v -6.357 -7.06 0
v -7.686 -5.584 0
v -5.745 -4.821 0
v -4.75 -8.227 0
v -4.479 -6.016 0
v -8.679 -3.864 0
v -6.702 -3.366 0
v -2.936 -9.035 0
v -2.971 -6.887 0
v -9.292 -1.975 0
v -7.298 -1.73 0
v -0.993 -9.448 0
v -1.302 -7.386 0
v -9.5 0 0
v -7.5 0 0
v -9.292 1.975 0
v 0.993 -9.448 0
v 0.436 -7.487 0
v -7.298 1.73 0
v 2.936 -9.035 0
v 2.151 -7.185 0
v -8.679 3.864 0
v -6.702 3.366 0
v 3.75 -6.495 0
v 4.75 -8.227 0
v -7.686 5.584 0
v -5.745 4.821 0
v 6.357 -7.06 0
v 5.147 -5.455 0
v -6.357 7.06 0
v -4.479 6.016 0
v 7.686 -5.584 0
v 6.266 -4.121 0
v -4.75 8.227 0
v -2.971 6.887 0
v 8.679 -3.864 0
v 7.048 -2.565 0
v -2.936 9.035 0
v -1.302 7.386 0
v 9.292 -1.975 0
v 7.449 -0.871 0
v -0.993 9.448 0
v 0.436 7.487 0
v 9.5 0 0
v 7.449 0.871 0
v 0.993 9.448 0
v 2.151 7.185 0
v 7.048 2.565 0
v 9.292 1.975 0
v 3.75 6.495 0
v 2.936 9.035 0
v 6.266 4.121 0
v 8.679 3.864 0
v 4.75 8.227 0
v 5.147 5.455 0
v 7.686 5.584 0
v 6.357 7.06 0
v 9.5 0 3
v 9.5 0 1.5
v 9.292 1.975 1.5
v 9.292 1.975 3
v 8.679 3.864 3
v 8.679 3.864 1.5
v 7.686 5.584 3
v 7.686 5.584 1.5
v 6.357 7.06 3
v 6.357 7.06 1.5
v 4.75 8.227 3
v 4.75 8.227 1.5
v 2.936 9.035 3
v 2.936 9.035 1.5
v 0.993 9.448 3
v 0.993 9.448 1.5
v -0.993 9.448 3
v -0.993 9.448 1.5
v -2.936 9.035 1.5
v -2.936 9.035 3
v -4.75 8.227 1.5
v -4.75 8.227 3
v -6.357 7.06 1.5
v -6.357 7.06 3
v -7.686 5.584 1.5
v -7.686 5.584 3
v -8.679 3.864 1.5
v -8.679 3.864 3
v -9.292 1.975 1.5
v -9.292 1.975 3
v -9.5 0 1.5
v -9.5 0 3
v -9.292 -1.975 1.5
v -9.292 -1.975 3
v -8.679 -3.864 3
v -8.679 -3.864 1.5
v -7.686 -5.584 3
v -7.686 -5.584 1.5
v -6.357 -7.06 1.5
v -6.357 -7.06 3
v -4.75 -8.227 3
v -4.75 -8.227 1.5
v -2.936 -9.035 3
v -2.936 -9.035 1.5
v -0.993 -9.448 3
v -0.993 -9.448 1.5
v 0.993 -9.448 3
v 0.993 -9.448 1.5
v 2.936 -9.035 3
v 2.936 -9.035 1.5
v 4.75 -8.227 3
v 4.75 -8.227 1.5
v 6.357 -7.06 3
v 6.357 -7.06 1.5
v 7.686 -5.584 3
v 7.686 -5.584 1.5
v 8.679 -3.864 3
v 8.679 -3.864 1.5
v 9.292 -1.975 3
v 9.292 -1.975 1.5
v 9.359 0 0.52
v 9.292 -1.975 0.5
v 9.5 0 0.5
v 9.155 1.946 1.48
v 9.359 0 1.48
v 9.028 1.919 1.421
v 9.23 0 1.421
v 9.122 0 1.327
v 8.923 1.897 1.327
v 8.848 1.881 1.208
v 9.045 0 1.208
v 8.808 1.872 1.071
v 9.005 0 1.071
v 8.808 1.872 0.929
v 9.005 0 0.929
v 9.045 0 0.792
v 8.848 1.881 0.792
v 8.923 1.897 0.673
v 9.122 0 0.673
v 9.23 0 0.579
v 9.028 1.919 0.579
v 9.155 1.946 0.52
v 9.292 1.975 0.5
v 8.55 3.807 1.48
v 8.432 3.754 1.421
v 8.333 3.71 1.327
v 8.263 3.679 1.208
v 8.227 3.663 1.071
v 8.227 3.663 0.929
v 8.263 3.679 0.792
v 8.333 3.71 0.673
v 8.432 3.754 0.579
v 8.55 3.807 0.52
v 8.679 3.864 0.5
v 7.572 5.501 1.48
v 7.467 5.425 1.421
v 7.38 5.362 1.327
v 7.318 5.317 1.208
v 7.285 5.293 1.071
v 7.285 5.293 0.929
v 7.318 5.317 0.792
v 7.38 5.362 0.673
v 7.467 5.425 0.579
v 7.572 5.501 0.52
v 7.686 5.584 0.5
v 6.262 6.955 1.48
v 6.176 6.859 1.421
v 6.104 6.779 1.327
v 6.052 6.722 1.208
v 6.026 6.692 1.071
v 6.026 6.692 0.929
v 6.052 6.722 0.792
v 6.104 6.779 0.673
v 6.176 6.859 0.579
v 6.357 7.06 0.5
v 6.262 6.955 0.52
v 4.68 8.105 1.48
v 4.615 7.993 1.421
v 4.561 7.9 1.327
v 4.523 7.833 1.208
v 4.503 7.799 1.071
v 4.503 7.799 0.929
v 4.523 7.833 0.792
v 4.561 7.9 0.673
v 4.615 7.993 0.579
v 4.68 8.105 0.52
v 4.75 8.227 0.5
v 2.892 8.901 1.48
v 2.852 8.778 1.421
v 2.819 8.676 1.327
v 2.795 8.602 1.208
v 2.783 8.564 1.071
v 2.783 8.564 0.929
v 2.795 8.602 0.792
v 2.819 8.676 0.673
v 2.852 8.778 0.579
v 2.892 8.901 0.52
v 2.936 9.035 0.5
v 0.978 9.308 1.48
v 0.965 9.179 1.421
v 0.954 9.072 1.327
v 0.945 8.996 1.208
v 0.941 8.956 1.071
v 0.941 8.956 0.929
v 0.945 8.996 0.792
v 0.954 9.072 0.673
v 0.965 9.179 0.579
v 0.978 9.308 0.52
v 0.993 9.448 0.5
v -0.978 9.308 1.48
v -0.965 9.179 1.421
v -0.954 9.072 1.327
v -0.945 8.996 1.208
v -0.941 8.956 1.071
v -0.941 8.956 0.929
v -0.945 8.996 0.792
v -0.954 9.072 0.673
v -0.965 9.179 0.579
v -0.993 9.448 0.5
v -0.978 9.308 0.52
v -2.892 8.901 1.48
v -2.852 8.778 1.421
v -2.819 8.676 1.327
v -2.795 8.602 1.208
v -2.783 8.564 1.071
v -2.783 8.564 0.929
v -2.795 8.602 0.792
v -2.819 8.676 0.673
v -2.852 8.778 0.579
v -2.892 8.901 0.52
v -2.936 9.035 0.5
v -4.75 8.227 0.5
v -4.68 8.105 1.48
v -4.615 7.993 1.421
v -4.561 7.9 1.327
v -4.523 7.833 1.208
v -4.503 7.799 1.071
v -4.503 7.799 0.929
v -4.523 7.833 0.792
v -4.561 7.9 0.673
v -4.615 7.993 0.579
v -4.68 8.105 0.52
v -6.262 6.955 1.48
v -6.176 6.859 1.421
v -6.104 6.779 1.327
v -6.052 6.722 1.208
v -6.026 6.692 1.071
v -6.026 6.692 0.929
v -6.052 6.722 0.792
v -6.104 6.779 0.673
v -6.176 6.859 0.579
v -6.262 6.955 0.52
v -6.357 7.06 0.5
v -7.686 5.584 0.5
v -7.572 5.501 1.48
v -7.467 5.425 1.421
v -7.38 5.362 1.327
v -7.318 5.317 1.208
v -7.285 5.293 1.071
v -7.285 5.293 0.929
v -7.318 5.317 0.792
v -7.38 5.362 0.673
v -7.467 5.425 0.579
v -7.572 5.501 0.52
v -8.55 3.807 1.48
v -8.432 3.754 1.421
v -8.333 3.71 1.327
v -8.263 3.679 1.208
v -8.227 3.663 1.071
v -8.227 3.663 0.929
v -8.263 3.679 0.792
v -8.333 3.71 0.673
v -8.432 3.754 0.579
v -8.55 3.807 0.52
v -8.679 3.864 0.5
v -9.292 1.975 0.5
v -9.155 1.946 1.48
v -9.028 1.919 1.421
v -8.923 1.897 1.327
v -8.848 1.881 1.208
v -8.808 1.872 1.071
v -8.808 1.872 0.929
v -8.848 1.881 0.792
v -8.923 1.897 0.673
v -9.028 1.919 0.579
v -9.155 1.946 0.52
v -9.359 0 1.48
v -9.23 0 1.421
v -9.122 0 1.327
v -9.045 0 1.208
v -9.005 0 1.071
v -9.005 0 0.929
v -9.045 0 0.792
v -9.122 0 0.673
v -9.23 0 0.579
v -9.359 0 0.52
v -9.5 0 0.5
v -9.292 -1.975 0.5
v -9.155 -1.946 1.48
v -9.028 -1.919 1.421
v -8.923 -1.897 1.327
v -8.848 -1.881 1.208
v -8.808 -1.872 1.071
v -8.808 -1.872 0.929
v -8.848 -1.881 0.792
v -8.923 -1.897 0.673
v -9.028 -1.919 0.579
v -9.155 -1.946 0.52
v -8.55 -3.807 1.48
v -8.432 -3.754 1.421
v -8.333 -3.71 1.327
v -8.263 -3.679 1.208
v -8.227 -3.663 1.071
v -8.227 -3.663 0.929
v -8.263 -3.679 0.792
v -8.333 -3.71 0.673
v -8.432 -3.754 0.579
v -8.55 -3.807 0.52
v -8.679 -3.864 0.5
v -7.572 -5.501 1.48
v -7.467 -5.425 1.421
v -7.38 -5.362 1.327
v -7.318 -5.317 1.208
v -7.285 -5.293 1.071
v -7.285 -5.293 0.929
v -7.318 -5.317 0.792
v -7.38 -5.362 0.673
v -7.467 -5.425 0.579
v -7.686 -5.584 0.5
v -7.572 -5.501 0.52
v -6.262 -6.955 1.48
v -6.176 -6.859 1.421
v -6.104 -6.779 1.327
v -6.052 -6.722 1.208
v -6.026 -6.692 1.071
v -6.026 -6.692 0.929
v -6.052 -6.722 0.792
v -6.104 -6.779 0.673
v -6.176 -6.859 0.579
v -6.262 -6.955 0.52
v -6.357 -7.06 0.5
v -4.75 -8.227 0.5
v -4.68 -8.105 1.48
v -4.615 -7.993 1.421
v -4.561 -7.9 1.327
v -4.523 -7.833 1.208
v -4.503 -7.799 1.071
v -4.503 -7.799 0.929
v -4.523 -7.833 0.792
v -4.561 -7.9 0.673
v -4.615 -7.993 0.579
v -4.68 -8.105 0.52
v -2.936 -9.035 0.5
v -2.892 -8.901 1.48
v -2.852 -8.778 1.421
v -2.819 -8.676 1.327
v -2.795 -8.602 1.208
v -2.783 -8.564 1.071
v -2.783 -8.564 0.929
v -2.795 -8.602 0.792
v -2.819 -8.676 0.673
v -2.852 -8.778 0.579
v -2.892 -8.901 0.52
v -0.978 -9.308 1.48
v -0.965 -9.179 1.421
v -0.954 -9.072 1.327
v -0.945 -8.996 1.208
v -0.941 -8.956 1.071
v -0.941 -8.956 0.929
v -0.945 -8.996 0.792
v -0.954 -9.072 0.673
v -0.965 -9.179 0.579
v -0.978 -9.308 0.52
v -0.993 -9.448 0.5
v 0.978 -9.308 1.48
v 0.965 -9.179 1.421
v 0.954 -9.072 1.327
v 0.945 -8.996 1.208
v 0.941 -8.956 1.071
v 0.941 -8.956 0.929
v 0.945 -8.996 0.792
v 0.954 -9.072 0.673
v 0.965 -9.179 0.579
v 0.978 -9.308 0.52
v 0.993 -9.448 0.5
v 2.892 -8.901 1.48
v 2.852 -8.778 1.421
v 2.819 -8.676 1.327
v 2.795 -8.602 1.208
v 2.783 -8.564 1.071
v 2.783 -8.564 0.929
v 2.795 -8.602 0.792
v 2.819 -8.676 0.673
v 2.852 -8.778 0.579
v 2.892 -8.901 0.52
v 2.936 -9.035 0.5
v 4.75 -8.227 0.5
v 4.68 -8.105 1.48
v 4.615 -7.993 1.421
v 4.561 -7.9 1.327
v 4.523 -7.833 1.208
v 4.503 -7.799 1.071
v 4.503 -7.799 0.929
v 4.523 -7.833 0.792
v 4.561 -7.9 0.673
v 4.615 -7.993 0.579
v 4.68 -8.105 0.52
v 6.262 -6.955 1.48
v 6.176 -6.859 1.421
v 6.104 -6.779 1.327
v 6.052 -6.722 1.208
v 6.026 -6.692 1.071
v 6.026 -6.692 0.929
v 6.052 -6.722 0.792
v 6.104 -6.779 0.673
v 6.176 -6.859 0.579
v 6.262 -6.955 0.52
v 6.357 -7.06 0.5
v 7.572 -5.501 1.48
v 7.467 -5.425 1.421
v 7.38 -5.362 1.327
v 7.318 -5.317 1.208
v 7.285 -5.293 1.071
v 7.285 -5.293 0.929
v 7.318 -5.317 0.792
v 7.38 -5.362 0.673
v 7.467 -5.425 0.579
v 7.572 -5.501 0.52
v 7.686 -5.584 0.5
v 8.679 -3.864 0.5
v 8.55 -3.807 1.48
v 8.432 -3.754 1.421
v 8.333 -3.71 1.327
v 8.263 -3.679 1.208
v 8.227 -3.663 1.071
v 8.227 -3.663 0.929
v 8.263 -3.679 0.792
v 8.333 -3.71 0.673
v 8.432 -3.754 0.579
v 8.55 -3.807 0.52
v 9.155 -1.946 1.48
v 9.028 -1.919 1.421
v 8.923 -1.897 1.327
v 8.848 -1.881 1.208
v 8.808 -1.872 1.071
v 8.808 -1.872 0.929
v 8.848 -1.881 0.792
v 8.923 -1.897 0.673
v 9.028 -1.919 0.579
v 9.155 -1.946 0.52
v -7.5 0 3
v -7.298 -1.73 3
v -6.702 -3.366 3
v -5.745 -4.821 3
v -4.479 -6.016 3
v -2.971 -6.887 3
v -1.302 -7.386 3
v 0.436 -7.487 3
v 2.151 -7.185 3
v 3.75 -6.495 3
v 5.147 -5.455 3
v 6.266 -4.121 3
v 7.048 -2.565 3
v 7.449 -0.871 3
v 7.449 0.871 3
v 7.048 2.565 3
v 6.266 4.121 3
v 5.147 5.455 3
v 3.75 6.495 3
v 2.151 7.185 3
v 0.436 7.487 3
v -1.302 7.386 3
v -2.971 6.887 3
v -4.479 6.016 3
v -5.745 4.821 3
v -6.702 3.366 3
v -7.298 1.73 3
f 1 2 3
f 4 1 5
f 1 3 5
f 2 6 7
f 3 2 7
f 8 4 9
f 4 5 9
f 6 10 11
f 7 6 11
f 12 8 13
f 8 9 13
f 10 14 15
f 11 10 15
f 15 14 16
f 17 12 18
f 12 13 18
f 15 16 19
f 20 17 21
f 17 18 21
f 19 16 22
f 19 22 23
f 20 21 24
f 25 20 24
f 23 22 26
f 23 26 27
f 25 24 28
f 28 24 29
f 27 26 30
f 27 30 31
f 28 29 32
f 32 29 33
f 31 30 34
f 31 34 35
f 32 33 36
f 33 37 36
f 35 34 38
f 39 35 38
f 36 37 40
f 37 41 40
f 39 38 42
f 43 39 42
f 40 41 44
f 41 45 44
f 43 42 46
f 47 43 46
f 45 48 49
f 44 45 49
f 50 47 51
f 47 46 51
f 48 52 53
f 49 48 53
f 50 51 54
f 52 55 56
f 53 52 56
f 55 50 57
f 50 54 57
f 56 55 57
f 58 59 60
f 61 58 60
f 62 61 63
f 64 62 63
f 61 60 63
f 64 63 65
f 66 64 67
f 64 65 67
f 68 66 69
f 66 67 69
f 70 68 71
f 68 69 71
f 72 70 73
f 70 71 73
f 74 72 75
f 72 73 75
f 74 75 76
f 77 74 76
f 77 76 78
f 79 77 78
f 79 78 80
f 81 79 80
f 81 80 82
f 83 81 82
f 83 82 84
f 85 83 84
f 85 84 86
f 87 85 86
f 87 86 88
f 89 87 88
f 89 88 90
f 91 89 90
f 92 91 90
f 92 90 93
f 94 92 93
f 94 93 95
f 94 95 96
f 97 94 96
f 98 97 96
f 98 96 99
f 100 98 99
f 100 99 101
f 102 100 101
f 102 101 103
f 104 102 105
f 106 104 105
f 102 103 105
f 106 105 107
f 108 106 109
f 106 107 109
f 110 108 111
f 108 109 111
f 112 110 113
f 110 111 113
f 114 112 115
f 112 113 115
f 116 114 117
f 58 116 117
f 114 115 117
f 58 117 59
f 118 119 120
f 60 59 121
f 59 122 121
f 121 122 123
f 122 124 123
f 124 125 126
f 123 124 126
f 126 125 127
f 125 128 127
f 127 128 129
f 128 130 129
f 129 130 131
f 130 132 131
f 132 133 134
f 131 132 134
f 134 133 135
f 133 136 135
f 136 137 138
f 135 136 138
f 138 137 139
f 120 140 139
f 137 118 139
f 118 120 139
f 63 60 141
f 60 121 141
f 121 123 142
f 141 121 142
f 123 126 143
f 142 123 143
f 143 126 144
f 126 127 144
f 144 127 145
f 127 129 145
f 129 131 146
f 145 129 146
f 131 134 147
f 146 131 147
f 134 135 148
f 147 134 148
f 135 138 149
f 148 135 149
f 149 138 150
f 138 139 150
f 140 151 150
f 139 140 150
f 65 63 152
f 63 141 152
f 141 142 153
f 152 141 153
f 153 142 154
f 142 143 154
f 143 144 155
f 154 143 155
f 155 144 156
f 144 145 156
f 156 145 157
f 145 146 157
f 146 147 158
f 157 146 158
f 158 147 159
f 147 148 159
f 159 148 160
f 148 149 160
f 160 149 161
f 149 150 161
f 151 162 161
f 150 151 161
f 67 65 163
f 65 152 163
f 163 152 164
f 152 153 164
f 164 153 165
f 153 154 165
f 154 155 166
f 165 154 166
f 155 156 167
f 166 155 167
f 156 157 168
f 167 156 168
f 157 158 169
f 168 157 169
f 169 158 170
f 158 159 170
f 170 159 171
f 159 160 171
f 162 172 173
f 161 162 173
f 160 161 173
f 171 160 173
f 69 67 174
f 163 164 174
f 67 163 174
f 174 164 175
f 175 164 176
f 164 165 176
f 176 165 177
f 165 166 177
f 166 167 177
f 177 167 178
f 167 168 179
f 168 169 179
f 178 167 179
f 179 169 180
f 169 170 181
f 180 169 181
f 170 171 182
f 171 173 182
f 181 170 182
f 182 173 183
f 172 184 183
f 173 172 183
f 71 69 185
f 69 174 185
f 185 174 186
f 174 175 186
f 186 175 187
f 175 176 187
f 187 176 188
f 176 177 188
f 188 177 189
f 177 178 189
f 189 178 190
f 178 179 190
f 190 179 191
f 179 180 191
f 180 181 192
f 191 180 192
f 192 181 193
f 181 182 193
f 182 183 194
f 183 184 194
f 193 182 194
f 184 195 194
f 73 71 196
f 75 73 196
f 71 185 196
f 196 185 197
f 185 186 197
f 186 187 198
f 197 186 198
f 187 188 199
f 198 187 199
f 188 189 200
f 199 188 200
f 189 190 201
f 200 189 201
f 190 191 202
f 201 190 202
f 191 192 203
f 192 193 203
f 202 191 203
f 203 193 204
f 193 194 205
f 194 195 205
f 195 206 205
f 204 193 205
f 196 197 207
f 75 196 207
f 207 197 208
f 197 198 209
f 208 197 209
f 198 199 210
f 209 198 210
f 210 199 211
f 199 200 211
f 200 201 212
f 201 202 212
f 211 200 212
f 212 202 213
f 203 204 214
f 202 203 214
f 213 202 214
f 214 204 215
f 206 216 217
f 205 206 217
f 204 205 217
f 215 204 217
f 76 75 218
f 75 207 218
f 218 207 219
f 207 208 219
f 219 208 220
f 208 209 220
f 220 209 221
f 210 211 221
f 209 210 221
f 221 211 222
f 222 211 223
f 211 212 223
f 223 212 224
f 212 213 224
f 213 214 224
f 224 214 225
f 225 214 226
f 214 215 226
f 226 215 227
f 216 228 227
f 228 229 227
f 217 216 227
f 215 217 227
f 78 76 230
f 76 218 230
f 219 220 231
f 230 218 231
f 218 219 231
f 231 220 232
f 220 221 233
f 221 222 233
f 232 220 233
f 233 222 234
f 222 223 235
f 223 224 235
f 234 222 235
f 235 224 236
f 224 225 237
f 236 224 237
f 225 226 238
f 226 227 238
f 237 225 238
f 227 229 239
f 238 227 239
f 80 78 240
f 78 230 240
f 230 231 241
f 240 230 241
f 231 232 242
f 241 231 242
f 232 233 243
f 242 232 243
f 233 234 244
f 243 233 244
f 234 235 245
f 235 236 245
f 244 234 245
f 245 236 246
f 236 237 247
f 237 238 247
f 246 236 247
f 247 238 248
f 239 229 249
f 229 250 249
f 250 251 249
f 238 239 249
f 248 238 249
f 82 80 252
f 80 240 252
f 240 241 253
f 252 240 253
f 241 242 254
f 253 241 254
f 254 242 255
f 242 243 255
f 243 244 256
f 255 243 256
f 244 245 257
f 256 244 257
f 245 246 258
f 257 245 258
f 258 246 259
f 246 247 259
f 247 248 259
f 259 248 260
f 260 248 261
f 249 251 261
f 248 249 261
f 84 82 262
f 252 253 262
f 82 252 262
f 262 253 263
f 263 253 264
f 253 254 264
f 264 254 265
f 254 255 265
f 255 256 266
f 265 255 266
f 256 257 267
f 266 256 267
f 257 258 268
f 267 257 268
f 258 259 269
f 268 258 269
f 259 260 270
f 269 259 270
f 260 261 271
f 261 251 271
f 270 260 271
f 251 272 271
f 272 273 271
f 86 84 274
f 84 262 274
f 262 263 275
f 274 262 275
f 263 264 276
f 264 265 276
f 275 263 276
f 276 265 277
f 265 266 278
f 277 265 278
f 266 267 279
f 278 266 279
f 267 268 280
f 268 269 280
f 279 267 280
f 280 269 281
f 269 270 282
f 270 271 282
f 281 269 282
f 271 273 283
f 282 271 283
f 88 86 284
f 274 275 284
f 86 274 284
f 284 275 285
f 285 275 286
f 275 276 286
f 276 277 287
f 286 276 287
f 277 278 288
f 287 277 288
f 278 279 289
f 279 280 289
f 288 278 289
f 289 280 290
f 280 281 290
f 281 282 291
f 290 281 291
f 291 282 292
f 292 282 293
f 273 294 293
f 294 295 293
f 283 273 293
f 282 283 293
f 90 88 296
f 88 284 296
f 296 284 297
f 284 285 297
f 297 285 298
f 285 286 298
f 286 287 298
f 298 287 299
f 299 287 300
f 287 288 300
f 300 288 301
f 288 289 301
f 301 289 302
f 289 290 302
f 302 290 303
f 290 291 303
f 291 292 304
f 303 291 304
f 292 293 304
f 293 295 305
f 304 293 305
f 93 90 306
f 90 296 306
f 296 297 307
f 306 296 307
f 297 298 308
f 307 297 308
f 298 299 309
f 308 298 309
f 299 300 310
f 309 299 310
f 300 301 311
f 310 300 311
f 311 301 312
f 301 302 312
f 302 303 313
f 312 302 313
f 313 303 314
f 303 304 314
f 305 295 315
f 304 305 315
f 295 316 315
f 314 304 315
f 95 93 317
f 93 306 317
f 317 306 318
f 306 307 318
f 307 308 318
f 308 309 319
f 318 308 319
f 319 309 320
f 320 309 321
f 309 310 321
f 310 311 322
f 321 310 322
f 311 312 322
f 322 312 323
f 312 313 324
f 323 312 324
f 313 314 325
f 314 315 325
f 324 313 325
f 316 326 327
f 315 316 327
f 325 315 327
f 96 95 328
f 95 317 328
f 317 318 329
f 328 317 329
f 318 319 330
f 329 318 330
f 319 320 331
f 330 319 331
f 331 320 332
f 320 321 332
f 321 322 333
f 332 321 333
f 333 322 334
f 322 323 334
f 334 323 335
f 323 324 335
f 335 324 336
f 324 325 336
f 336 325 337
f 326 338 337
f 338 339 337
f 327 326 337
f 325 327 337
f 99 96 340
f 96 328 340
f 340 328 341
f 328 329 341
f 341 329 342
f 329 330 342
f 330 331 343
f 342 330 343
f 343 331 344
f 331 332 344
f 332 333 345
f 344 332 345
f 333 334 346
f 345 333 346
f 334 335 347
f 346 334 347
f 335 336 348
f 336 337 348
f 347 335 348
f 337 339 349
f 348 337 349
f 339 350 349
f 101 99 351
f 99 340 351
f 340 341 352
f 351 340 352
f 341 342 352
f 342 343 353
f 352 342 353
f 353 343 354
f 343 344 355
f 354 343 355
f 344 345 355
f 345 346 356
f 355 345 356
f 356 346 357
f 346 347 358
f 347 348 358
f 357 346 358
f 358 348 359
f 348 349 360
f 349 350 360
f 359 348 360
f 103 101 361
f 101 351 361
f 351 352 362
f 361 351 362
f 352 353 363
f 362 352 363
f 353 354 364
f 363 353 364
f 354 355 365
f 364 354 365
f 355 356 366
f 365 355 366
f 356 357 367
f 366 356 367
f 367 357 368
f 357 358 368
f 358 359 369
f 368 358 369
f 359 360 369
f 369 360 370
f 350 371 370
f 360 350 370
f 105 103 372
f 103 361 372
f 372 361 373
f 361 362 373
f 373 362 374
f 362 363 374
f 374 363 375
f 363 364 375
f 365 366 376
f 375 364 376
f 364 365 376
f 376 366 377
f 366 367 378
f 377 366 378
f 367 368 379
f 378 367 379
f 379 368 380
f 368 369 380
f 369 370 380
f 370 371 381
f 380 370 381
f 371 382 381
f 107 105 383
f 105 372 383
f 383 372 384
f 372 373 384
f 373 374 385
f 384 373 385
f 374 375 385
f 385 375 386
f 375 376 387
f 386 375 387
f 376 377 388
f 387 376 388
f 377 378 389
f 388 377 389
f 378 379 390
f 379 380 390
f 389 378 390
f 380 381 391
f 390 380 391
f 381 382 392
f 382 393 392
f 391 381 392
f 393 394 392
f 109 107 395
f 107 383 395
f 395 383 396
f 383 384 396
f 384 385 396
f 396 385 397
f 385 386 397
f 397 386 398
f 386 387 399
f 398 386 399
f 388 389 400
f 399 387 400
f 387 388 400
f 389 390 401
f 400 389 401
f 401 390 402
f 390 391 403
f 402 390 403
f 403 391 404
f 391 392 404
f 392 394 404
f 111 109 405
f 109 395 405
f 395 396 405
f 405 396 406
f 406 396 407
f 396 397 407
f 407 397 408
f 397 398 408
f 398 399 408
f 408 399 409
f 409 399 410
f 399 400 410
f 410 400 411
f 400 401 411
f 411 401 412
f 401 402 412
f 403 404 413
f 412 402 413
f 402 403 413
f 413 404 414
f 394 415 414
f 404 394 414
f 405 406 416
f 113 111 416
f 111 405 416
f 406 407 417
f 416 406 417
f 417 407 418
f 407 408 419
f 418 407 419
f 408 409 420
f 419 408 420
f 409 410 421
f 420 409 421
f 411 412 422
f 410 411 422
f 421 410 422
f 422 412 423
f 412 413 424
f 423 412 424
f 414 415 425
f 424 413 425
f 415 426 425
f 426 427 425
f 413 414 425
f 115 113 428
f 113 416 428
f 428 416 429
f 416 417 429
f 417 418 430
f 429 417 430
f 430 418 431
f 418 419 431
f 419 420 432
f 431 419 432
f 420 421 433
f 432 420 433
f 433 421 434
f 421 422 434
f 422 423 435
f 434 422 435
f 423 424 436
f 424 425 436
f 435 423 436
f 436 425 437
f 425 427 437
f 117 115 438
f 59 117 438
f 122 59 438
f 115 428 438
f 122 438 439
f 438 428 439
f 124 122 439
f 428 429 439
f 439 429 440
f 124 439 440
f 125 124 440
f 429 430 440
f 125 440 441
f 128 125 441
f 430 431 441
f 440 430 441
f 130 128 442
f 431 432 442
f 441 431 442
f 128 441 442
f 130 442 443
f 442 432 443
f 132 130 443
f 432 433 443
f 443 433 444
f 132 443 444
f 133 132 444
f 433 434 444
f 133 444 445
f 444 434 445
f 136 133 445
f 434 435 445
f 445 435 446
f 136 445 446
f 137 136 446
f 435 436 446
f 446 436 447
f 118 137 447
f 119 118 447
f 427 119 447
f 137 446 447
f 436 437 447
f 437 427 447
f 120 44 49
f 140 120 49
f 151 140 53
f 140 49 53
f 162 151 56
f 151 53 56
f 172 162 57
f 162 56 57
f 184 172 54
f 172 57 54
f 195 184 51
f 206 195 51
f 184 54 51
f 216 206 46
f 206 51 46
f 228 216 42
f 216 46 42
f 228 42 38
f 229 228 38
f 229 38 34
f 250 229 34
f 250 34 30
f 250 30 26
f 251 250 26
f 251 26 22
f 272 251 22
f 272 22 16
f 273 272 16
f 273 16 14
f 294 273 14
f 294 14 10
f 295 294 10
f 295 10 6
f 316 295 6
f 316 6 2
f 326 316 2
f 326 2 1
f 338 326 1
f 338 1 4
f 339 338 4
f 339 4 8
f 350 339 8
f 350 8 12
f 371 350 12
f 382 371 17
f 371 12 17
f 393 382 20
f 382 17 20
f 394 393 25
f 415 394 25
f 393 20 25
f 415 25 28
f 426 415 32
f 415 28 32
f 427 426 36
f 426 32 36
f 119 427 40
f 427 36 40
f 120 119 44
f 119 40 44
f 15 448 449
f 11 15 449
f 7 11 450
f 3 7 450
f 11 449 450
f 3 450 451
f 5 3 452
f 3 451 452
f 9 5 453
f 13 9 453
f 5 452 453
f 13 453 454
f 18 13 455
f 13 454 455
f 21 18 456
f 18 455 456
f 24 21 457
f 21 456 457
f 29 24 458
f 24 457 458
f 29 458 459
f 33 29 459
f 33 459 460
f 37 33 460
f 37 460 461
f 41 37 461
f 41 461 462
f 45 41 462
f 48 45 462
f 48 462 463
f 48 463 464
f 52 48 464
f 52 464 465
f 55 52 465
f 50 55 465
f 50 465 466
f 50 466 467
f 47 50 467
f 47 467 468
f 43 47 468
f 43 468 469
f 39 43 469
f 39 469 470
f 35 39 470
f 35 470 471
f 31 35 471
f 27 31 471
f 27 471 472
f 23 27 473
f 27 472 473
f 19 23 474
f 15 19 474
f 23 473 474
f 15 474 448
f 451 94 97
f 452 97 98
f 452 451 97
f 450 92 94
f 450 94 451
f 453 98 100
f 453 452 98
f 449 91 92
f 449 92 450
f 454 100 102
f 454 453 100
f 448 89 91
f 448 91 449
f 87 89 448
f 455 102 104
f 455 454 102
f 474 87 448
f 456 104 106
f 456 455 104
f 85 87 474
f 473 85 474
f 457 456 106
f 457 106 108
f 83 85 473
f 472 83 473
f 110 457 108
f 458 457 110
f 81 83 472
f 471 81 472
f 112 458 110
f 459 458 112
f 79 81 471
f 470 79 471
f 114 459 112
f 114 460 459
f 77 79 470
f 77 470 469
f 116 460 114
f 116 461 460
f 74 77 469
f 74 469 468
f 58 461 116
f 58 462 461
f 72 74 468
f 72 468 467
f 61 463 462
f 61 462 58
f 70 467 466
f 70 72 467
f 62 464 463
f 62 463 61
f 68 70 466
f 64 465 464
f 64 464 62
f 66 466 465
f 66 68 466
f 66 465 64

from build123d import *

# Parameters (mm, degrees)
F0_R     = 9.5
F1_DEPTH = 3
F2_R     = 0.5
F7_D     = 15


with BuildPart() as f1:
    # F0 (on Top) → F1 (new body)
    with BuildSketch(Plane.XY):
        Circle(F0_R)
    extrude(amount=F1_DEPTH)

    # F5: sweep along a path in F4
    with BuildLine(Plane.XY.offset(1)) as f5_path:
        CenterArc((0, 0), 9.5, 0, 360)
    # F2 (on Front) → F5 (sweep, cut)
    with BuildSketch(Plane.XZ):
        with Locations((9.5, 1)):
            Circle(F2_R)
    sweep(path=f5_path.line, mode=Mode.SUBTRACT)

    # F7 (through all)
    with Locations(Plane(origin=(0, 0, 0), x_dir=(1, 0, 0), z_dir=(0, 0, -1))):
        with Locations((0, 0)):
            Hole(F7_D / 2)


solid = f1.part
